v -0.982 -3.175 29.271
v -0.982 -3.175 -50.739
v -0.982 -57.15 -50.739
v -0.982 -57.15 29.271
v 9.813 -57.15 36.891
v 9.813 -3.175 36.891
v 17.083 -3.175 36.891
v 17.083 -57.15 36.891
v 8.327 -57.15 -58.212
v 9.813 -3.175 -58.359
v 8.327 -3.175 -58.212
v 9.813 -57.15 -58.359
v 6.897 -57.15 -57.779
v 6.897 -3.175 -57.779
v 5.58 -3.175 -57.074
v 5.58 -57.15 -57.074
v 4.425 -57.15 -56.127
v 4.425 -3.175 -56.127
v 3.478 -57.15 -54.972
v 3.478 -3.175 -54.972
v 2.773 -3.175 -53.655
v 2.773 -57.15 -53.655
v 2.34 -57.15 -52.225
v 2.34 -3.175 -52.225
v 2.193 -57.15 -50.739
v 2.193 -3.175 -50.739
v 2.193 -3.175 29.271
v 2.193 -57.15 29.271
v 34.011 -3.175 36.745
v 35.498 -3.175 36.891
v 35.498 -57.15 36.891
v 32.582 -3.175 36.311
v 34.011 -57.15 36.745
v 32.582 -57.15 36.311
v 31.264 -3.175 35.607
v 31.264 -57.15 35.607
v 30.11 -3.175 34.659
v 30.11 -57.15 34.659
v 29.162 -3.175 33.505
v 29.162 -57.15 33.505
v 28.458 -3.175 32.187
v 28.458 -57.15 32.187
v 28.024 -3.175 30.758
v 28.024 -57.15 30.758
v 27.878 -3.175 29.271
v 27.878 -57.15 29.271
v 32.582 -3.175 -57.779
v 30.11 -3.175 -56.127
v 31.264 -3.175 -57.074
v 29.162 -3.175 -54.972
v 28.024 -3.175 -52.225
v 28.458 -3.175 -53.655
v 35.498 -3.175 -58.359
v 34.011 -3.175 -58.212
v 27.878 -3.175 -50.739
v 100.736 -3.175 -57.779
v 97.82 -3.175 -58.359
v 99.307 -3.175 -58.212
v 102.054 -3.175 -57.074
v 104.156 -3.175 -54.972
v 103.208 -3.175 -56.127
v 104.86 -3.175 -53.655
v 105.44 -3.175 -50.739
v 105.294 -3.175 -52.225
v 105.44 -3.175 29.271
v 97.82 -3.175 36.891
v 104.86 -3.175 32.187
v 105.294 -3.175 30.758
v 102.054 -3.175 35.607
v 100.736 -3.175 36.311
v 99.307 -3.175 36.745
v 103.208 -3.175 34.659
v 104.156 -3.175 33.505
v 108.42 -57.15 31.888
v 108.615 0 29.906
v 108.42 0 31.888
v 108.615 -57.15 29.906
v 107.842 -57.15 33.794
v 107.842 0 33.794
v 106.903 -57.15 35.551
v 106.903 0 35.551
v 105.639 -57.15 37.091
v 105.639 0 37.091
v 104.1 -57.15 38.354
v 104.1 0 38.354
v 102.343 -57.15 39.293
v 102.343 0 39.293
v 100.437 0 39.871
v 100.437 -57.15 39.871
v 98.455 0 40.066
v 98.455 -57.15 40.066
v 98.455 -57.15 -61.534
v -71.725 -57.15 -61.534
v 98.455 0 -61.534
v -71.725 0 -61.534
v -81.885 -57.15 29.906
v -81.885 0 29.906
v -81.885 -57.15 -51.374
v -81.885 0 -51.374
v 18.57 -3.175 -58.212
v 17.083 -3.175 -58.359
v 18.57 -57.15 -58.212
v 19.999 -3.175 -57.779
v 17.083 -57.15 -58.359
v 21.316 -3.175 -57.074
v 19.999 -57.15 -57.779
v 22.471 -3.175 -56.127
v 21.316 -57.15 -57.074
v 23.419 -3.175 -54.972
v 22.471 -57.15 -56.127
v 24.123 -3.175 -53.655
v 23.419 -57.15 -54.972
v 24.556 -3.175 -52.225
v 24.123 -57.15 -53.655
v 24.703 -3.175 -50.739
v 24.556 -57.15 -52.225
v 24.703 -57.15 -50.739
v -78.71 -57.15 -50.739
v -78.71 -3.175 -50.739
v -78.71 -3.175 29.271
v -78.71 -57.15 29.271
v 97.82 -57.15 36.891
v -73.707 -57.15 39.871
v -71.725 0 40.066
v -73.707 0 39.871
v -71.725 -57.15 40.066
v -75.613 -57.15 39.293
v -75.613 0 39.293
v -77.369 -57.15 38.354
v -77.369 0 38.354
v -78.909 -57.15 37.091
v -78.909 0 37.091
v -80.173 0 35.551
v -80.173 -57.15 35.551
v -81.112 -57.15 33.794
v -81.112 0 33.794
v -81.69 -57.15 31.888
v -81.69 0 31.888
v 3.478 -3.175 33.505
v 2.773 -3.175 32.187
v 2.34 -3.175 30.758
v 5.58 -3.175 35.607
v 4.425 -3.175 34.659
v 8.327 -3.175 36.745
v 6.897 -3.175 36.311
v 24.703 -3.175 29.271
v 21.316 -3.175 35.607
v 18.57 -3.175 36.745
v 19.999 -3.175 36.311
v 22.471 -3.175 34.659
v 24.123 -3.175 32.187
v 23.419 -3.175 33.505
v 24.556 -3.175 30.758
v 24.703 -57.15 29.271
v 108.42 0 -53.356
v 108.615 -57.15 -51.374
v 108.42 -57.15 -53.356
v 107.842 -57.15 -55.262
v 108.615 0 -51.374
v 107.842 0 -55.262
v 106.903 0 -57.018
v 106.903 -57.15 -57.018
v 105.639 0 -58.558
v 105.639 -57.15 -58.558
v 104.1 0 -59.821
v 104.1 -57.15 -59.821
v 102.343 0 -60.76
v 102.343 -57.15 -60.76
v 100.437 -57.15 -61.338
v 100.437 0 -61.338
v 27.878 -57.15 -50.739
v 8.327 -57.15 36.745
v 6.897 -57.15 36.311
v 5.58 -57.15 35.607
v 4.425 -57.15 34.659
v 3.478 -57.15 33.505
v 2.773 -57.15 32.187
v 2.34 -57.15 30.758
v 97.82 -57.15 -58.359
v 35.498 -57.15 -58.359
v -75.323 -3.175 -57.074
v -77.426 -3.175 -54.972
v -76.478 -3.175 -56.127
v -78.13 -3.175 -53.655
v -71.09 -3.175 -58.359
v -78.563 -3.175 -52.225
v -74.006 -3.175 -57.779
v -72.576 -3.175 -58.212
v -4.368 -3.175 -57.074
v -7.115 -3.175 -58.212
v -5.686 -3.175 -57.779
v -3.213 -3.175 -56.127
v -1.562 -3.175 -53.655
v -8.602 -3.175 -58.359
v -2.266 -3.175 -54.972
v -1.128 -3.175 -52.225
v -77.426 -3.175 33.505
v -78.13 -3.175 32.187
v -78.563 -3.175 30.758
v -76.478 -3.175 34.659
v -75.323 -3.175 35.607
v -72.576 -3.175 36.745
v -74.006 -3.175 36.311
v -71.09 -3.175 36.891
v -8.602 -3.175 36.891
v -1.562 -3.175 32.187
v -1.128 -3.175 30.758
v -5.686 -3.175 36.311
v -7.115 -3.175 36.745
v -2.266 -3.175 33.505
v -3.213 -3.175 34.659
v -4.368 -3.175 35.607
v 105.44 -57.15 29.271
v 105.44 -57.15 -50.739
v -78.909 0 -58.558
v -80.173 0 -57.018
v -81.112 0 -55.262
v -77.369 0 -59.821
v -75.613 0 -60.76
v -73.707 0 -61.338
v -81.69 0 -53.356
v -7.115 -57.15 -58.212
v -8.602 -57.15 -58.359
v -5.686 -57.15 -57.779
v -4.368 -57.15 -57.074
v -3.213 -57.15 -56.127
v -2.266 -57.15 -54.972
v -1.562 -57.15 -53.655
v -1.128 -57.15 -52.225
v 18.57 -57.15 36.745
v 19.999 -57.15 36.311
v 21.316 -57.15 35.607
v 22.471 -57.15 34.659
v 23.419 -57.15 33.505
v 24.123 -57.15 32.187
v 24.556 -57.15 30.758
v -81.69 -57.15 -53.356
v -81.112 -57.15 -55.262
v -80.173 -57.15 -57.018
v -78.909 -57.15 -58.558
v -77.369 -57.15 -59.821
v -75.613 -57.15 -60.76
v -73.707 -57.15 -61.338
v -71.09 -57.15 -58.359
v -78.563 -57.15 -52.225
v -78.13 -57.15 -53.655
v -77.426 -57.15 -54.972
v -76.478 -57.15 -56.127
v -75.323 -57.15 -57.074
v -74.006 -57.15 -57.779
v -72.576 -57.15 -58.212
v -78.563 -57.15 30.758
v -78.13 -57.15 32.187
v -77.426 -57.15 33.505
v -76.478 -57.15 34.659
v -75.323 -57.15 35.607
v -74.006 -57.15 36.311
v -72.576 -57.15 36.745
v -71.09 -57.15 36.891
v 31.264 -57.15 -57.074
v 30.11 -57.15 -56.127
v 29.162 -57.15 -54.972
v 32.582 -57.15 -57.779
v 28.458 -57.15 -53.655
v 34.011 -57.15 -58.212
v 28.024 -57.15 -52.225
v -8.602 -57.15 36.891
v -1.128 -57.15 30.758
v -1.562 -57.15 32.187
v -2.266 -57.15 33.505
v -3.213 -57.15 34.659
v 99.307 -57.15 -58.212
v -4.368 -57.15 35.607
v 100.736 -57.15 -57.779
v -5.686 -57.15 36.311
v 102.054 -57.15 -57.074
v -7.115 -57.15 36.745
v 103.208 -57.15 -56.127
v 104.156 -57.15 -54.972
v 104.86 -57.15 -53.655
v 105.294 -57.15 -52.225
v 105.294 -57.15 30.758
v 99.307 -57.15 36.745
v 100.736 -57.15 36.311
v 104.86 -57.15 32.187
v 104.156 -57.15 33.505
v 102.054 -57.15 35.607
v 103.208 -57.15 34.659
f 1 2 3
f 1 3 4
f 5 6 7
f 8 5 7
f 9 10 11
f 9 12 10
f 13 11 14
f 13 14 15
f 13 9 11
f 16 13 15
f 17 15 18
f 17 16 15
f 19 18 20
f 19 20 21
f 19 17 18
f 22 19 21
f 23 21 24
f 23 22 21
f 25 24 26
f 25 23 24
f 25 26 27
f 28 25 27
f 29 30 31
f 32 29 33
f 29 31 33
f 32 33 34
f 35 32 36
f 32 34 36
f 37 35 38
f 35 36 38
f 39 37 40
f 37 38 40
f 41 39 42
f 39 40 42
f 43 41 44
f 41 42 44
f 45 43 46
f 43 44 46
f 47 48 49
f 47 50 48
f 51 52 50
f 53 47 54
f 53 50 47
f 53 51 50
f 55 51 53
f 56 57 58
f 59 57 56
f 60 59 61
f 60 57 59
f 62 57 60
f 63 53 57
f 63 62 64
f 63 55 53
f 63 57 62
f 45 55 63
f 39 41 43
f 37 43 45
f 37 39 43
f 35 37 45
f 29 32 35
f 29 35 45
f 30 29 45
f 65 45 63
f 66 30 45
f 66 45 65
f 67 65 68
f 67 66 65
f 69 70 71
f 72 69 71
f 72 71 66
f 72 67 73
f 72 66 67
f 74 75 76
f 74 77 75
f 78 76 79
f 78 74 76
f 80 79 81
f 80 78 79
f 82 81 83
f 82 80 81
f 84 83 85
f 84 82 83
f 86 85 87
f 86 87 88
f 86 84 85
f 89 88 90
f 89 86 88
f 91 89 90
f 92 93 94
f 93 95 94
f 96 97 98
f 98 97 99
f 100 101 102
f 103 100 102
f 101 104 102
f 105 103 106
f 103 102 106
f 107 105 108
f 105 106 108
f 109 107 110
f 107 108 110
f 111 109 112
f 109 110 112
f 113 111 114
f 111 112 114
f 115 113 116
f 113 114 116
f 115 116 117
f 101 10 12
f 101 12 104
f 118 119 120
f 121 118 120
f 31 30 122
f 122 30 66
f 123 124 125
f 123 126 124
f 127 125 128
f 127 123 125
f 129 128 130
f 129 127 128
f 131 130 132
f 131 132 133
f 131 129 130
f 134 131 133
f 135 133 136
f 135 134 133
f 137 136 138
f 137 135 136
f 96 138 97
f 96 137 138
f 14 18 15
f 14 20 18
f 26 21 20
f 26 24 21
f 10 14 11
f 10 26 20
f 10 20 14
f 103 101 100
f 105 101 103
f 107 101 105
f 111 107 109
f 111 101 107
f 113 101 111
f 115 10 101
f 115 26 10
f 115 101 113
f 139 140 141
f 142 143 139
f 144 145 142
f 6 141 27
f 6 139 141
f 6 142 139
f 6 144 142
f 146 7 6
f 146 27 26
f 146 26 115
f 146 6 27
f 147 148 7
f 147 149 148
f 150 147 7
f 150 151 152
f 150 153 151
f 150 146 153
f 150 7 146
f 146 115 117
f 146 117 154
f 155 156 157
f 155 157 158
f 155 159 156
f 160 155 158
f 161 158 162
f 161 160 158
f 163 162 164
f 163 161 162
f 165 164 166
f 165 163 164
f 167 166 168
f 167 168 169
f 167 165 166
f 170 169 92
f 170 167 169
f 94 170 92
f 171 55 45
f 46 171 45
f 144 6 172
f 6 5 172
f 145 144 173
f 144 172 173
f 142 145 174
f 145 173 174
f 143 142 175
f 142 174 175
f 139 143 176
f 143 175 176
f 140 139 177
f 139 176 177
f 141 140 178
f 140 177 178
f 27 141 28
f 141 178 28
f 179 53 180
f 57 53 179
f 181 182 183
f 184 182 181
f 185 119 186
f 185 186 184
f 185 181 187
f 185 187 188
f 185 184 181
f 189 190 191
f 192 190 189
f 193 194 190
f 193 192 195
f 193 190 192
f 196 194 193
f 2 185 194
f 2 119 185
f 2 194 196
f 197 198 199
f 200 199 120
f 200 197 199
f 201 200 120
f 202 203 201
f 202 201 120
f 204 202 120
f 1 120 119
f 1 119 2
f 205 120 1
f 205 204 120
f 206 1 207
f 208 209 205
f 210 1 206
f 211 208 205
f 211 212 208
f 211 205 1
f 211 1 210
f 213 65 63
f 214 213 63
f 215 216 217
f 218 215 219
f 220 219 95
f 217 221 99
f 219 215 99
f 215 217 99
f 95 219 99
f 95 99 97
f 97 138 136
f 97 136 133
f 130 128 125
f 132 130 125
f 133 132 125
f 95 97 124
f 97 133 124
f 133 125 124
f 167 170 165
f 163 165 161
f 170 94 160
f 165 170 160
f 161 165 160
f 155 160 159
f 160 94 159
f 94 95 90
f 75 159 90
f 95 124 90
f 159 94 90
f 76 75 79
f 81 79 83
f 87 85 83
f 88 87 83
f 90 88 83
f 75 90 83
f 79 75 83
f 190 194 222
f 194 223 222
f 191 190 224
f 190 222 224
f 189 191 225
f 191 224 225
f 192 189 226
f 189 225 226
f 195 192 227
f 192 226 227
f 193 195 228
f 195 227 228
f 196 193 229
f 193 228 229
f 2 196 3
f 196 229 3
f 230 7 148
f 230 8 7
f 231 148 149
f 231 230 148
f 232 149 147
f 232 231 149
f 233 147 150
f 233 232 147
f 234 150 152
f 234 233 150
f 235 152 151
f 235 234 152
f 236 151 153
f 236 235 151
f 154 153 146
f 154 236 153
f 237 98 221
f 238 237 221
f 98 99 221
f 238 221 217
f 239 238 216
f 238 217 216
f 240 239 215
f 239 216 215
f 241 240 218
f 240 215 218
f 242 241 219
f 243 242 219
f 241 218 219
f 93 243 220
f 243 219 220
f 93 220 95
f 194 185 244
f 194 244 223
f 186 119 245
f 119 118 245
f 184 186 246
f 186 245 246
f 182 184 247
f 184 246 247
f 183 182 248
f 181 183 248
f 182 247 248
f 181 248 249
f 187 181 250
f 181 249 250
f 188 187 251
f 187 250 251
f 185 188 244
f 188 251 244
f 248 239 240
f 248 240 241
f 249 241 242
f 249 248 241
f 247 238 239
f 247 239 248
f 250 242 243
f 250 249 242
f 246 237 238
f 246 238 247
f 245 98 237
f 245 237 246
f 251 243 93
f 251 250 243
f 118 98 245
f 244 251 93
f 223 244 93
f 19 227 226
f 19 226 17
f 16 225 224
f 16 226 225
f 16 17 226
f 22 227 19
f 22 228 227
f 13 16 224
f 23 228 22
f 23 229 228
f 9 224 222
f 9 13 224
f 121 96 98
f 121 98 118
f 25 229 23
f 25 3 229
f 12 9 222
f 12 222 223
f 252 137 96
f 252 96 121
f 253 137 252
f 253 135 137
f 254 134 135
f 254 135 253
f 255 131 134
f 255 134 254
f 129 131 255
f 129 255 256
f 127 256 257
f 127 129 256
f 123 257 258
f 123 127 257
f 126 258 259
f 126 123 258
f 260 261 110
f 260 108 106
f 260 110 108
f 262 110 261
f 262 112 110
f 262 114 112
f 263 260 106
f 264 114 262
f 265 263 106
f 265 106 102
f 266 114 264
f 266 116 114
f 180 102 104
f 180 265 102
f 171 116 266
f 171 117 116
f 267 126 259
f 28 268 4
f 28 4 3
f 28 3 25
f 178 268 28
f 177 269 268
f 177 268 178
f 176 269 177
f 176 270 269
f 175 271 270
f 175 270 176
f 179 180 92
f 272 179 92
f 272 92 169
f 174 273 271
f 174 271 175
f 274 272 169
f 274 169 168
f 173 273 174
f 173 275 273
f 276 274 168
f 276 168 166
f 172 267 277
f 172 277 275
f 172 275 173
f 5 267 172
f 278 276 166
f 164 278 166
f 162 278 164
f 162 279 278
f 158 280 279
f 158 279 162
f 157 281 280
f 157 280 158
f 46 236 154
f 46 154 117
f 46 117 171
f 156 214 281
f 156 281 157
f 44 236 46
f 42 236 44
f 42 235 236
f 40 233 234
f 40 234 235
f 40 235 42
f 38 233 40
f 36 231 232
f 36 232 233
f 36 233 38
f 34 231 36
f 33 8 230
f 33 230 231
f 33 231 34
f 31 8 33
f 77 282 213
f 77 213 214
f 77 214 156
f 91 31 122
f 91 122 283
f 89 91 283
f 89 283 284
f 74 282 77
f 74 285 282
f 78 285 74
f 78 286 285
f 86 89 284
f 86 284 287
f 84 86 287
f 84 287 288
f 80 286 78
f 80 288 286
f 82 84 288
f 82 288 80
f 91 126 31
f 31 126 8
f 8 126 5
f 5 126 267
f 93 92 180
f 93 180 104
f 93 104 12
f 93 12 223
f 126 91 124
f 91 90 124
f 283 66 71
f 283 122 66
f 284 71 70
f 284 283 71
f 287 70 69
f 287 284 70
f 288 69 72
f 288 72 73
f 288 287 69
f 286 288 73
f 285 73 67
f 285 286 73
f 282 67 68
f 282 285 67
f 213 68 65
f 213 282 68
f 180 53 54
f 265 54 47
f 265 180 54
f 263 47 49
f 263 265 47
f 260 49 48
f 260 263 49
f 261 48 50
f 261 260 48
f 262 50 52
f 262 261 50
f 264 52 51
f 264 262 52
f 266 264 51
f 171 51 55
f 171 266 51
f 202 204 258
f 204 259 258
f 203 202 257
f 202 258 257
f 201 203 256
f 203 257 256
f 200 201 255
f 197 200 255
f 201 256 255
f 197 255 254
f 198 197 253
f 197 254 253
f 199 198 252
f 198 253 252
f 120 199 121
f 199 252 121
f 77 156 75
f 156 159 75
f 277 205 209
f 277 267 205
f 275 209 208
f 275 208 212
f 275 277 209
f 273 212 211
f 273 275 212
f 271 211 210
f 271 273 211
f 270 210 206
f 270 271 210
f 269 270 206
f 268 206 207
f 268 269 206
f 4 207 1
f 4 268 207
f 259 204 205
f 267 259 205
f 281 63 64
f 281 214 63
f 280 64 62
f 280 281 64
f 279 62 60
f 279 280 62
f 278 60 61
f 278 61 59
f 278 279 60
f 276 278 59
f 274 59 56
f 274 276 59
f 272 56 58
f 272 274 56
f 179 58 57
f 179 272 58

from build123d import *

# Parameters (mm, degrees)
F0_W     = 190.5
F0_H     = 101.6
F1_DEPTH = 3.175
F2_W     = 184.15
F2_H     = 3.175
F3_DEPTH = 53.975
F4_W     = 3.175
F4_H     = 95.25
F5_DEPTH = 53.975
F6_R     = 7.62
F7_R     = 7.62
F8_W     = 3.175
F8_H     = 95.25
F9_DEPTH = 53.975
F10_R    = 7.62
F11_R    = 7.62
F12_R    = 10.16


with BuildPart() as f1:
    # F0 (on Front) → F1 (new body)
    with BuildSketch(Plane.XZ):
        with Locations((13.3651066571, -10.7336564614)):
            Rectangle(F0_W, F0_H)
    extrude(amount=F1_DEPTH)

    # F2 (on face) → F3 (join)
    with BuildSketch(Plane.XZ.offset(3.175)):
        Polygon((108.6151066571, -61.5336564614), (108.6151066571, 40.0663435386), (105.4401066571, 40.0663435386), (105.4401066571, 36.8913435386), (105.4401066571, -58.3586564614), (105.4401066571, -61.5336564614), align=None)
        with Locations((13.3651066571, 38.4788435386)):
            Rectangle(F2_W, F2_H)
        Polygon((-78.7098933429, 36.8913435386), (-78.7098933429, 40.0663435386), (-81.8848933429, 40.0663435386), (-81.8848933429, -61.5336564614), (-78.7098933429, -61.5336564614), (-78.7098933429, -58.3586564614), align=None)
        with Locations((13.3651066571, -59.9461564614)):
            Rectangle(F2_W, F2_H)
    extrude(amount=F3_DEPTH)

    # F4 (on face) → F5 (join)
    with BuildSketch(Plane.XZ.offset(3.175)):
        with Locations((0.60594371, -10.7336564614)):
            Rectangle(F4_W, F4_H)
    extrude(amount=F5_DEPTH)

    # F6
    f6_edges = [f1.edges().sort_by_distance(p)[0] for p in [
        (-0.981556, -30.1625, -58.358656),
        (2.193444, -30.1625, 36.891344),
        (2.193444, -30.1625, -58.358656),
        (-0.981556, -30.1625, 36.891344),
    ]]
    fillet(f6_edges, radius=F6_R)

    # F7
    f7_edges = [f1.edges().sort_by_distance(p)[0] for p in [
        (-78.709893, -30.1625, -58.358656),
        (-78.709893, -30.1625, 36.891344),
    ]]
    fillet(f7_edges, radius=F7_R)

    # F8 (on face) → F9 (join)
    with BuildSketch(Plane.XZ.offset(3.175)):
        with Locations((26.2904159218, -10.7336564614)):
            Rectangle(F8_W, F8_H)
    extrude(amount=F9_DEPTH)

    # F10
    f10_edges = [f1.edges().sort_by_distance(p)[0] for p in [
        (24.702916, -30.1625, -58.358656),
        (24.702916, -30.1625, 36.891344),
        (27.877916, -30.1625, 36.891344),
        (27.877916, -30.1625, -58.358656),
    ]]
    fillet(f10_edges, radius=F10_R)

    # F11
    f11_edges = [f1.edges().sort_by_distance(p)[0] for p in [
        (105.440107, -30.1625, 36.891344),
        (105.440107, -30.1625, -58.358656),
    ]]
    fillet(f11_edges, radius=F11_R)

    # F12
    f12_edges = [f1.edges().sort_by_distance(p)[0] for p in [
        (-81.884893, -28.575, -61.533656),
        (108.615107, -28.575, -61.533656),
        (108.615107, -28.575, 40.066344),
        (-81.884893, -28.575, 40.066344),
    ]]
    fillet(f12_edges, radius=F12_R)


solid = f1.part
